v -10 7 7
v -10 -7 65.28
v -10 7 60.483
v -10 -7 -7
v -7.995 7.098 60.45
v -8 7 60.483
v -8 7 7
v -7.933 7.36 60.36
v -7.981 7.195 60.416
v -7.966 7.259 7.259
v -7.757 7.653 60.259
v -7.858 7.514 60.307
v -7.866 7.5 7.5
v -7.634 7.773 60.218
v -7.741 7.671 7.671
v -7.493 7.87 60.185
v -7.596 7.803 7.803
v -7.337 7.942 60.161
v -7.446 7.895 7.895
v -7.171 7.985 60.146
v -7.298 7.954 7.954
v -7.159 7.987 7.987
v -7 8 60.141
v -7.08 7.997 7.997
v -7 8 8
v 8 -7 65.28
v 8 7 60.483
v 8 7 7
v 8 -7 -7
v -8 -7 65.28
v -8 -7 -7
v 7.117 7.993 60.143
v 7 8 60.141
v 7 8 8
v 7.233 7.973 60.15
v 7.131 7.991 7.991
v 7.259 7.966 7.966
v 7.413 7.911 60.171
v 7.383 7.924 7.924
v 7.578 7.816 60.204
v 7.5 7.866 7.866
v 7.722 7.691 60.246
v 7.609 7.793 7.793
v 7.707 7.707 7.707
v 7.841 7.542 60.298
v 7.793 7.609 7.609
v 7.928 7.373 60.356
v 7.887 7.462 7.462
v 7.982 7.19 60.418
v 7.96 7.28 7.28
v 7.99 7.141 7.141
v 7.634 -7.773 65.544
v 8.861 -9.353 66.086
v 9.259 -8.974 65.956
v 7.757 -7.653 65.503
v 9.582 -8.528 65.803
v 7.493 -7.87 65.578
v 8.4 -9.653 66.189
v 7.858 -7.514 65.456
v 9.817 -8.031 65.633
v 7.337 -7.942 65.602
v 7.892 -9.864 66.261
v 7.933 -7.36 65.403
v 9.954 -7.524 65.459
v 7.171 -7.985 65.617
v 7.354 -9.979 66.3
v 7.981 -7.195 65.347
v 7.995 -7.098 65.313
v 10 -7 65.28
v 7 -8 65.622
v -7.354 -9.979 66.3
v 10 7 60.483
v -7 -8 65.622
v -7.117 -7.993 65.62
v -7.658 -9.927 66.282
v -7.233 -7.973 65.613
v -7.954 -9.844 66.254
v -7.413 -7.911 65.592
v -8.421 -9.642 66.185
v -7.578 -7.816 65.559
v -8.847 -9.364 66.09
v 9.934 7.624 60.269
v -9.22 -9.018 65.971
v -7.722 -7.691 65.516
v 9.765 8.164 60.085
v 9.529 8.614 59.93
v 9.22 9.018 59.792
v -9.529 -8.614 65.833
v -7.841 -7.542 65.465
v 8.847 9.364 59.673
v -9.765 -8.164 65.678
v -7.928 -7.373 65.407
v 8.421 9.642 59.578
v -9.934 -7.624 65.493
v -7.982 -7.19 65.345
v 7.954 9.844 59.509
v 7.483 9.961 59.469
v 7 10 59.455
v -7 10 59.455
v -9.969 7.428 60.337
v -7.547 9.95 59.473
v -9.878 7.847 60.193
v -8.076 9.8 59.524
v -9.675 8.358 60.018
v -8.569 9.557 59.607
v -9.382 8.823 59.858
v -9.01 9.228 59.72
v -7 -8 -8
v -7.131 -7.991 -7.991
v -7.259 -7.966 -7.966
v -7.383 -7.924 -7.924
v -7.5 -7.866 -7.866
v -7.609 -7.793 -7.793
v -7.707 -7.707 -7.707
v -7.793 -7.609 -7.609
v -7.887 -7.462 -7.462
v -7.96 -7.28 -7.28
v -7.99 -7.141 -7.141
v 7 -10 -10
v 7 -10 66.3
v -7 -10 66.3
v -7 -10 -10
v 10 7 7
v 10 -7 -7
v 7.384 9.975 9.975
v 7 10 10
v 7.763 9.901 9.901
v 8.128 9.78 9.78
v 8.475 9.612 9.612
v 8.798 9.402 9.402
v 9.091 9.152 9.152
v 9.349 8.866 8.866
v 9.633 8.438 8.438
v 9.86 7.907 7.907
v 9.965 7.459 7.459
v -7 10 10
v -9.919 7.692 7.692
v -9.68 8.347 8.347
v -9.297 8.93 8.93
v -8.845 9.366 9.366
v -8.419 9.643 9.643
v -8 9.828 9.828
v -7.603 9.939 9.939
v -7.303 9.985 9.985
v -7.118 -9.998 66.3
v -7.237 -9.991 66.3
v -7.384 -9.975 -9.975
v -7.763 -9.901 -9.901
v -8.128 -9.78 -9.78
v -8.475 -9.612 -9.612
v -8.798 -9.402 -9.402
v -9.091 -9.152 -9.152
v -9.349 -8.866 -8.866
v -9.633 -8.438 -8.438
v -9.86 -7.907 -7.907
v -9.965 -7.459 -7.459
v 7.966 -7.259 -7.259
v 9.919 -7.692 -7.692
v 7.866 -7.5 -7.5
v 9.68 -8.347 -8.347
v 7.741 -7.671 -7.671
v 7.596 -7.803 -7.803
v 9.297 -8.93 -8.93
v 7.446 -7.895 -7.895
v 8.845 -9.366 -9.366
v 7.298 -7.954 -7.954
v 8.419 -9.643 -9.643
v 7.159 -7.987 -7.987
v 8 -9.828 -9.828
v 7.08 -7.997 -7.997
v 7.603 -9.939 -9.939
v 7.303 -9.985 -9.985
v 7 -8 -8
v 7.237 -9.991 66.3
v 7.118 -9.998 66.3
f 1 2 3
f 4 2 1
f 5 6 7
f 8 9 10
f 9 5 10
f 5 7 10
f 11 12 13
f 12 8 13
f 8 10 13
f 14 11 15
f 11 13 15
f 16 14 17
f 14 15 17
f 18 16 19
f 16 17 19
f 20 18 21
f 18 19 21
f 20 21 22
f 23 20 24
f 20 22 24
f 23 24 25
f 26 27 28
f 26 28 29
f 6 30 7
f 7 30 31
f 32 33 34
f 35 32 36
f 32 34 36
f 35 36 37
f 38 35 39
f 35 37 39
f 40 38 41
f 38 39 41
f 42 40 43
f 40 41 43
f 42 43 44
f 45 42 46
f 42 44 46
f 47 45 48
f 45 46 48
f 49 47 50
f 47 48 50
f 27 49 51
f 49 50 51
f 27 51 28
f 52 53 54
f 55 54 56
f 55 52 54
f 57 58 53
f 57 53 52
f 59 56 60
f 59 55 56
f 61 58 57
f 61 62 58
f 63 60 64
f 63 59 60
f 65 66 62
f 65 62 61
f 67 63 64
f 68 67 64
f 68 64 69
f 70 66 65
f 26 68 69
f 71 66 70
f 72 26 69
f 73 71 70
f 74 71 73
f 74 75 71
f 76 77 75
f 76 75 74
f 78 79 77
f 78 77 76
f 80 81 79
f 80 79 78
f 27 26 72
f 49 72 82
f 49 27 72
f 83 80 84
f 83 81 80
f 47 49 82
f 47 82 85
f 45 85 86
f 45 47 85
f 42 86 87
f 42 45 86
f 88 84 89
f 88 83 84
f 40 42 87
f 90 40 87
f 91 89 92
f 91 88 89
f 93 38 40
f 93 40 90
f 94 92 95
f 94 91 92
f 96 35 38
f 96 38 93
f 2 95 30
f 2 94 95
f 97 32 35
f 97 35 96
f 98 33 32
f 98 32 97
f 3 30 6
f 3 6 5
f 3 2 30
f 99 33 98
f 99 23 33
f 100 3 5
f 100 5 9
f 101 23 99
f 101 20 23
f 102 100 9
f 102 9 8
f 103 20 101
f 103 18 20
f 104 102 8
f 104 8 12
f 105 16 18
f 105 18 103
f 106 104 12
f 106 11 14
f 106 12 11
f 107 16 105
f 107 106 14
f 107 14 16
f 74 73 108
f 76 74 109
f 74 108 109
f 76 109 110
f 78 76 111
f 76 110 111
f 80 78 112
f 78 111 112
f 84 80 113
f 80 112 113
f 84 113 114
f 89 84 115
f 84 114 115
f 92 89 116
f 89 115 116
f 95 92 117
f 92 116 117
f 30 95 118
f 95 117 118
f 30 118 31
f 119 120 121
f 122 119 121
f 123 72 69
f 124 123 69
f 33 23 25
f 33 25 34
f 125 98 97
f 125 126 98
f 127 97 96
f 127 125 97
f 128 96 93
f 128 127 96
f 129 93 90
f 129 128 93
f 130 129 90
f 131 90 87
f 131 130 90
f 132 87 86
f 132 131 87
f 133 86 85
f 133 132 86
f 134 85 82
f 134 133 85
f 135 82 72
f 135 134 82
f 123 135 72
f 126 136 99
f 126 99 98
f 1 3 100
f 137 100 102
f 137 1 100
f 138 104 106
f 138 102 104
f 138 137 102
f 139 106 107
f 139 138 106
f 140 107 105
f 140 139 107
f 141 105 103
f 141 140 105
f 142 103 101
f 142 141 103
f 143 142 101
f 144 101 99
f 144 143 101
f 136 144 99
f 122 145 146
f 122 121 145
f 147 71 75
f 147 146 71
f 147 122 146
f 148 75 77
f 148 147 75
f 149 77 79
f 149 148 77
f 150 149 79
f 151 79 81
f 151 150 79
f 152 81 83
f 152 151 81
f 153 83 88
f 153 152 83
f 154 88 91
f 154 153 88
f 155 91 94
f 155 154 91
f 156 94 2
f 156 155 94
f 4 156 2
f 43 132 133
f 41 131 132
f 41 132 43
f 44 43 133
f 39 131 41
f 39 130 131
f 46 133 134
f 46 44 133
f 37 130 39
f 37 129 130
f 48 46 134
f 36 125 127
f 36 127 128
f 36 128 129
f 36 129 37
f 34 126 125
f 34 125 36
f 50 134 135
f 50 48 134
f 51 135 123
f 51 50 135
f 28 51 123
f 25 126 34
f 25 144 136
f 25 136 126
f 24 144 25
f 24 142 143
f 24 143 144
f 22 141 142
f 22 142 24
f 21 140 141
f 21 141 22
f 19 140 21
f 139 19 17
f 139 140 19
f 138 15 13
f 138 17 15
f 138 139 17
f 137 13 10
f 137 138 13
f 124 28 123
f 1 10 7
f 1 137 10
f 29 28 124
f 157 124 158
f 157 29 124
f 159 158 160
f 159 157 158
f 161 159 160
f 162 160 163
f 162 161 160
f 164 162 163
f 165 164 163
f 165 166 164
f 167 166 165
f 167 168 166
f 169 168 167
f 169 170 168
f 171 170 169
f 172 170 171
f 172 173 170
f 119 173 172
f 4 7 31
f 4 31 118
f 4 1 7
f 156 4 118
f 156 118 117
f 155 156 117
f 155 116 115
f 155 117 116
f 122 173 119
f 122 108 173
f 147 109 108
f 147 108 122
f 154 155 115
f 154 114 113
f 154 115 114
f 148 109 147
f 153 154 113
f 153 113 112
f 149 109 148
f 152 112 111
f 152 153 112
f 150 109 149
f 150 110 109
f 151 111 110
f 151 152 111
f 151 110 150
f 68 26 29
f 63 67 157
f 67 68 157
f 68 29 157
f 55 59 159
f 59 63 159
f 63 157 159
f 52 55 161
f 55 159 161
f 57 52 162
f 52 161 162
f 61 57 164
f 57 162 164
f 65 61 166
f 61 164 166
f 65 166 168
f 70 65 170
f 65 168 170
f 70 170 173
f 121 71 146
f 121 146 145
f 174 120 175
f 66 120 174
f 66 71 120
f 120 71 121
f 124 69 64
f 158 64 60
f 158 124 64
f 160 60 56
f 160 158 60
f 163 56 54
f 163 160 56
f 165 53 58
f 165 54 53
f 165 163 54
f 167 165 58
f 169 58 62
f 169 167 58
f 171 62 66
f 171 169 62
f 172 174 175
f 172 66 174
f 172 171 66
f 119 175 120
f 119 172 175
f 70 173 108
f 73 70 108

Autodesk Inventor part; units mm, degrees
ref_plane "Start Plane" through (0, 0, -10) normal (0, 0, 1) x (1, 0, 0)
ref_plane "End Plane" through (0, 0, 66.3002) normal (0, 0, 1) x (1, 0, 0)
sketch "Sketch" plane through (0, 0, 0) normal (0, 0, 1) x (1, 0, 0)
  line L0 (-10, -7) -> (-10, 7)
  line L1 (-7, 10) -> (7, 10)
  line L2 (10, 7) -> (10, -7)
  line L3 (7, -10) -> (-7, -10)
  arc A0 (-10, -7) -> (-7, -10) centre (-7, -7) ccw
  arc A1 (-7, 10) -> (-10, 7) centre (-7, 7) ccw
  arc A2 (10, 7) -> (7, 10) centre (7, 7) ccw
  arc A3 (7, -10) -> (10, -7) centre (7, -7) ccw
  arc A4 (-7, 8) -> (-8, 7) centre (-7, 7) ccw
  line L4 (-7, 8) -> (7, 8)
  arc A5 (8, 7) -> (7, 8) centre (7, 7) ccw
  line L5 (8, 7) -> (8, -7)
  arc A6 (7, -8) -> (8, -7) centre (7, -7) ccw
  line L6 (7, -8) -> (-7, -8)
  arc A7 (-8, -7) -> (-7, -8) centre (-7, -7) ccw
  line L7 (-8, -7) -> (-8, 7)
  line L8 (0, 14.8698) -> (0, -14.8698) construction
  line L9 (-14.8698, 0) -> (14.8698, 0) construction
  dimension "d7" = 3
  dimension "d10" = 20
  dimension "d11" = 20
  dimension "d12" = 2
  dimension "d15" = 10
  dimension "d16" = 10
extrude "Body" add sketch "Sketch" along normal up to surface (76.3002 mm away) from surface at -10
sketch "Sketch3" plane through (0, 0, 0) normal (0, 0, 1) x (1, 0, 0)
  line L0 (0, 0) -> (10, 0)
ref_plane "Work Plane3" through (0, 0, 0) normal (0, -1, 0) x (1, 0, 0)
sketch "Sketch4" plane through (0, 0, 0) normal (0, -1, 0) x (1, 0, 0)
  line L0 (-2, -10) -> (12, -10)
  line L1 (-2, 66.3002) -> (12, 66.3002)
  dimension "d18" = 76.3002
ref_plane "Work Plane4" through (-7, -153.7024, 115.5399) normal (0, 0.3241, 0.946) x (1, 0, 0)
split "Split1" plane through (-7, -153.7024, 115.5399) removes the side toward (0, 0.3241, 0.946)
ref_plane "Work Plane7" through (0, -10, -10) normal (0, 0.7071, -0.7071) x (1, 0, 0)
split "Split4" plane through (0, -10, -10) removes the side toward (0, 0.7071, -0.7071)
equation "\"d7\" = G_IR"
equation "\"d10\" = G_H"
equation "\"d11\" = G_W"
equation "\"d12\" = G_T"
equation "\"d15\" = 0.5 * d10"
equation "\"d16\" = 0.5 * d11"
equation "\"d3\" = G_L"
equation "\"G_W\" = 20"
equation "\"G_H\" = 20"
equation "\"G_T\" = 2"
equation "\"G_IR\" = 3"
equation "\"G_L\" = d18"
equation "\"G_OFFSET_END\" = -7.14425"
equation "\"d14\" = G_OFFSET_END + B_L"
equation "\"B_L\" = 73.44444"
properties part number "ISO 12633-2 - 20x20x2 - 76,3" material "Steel, Mild"
